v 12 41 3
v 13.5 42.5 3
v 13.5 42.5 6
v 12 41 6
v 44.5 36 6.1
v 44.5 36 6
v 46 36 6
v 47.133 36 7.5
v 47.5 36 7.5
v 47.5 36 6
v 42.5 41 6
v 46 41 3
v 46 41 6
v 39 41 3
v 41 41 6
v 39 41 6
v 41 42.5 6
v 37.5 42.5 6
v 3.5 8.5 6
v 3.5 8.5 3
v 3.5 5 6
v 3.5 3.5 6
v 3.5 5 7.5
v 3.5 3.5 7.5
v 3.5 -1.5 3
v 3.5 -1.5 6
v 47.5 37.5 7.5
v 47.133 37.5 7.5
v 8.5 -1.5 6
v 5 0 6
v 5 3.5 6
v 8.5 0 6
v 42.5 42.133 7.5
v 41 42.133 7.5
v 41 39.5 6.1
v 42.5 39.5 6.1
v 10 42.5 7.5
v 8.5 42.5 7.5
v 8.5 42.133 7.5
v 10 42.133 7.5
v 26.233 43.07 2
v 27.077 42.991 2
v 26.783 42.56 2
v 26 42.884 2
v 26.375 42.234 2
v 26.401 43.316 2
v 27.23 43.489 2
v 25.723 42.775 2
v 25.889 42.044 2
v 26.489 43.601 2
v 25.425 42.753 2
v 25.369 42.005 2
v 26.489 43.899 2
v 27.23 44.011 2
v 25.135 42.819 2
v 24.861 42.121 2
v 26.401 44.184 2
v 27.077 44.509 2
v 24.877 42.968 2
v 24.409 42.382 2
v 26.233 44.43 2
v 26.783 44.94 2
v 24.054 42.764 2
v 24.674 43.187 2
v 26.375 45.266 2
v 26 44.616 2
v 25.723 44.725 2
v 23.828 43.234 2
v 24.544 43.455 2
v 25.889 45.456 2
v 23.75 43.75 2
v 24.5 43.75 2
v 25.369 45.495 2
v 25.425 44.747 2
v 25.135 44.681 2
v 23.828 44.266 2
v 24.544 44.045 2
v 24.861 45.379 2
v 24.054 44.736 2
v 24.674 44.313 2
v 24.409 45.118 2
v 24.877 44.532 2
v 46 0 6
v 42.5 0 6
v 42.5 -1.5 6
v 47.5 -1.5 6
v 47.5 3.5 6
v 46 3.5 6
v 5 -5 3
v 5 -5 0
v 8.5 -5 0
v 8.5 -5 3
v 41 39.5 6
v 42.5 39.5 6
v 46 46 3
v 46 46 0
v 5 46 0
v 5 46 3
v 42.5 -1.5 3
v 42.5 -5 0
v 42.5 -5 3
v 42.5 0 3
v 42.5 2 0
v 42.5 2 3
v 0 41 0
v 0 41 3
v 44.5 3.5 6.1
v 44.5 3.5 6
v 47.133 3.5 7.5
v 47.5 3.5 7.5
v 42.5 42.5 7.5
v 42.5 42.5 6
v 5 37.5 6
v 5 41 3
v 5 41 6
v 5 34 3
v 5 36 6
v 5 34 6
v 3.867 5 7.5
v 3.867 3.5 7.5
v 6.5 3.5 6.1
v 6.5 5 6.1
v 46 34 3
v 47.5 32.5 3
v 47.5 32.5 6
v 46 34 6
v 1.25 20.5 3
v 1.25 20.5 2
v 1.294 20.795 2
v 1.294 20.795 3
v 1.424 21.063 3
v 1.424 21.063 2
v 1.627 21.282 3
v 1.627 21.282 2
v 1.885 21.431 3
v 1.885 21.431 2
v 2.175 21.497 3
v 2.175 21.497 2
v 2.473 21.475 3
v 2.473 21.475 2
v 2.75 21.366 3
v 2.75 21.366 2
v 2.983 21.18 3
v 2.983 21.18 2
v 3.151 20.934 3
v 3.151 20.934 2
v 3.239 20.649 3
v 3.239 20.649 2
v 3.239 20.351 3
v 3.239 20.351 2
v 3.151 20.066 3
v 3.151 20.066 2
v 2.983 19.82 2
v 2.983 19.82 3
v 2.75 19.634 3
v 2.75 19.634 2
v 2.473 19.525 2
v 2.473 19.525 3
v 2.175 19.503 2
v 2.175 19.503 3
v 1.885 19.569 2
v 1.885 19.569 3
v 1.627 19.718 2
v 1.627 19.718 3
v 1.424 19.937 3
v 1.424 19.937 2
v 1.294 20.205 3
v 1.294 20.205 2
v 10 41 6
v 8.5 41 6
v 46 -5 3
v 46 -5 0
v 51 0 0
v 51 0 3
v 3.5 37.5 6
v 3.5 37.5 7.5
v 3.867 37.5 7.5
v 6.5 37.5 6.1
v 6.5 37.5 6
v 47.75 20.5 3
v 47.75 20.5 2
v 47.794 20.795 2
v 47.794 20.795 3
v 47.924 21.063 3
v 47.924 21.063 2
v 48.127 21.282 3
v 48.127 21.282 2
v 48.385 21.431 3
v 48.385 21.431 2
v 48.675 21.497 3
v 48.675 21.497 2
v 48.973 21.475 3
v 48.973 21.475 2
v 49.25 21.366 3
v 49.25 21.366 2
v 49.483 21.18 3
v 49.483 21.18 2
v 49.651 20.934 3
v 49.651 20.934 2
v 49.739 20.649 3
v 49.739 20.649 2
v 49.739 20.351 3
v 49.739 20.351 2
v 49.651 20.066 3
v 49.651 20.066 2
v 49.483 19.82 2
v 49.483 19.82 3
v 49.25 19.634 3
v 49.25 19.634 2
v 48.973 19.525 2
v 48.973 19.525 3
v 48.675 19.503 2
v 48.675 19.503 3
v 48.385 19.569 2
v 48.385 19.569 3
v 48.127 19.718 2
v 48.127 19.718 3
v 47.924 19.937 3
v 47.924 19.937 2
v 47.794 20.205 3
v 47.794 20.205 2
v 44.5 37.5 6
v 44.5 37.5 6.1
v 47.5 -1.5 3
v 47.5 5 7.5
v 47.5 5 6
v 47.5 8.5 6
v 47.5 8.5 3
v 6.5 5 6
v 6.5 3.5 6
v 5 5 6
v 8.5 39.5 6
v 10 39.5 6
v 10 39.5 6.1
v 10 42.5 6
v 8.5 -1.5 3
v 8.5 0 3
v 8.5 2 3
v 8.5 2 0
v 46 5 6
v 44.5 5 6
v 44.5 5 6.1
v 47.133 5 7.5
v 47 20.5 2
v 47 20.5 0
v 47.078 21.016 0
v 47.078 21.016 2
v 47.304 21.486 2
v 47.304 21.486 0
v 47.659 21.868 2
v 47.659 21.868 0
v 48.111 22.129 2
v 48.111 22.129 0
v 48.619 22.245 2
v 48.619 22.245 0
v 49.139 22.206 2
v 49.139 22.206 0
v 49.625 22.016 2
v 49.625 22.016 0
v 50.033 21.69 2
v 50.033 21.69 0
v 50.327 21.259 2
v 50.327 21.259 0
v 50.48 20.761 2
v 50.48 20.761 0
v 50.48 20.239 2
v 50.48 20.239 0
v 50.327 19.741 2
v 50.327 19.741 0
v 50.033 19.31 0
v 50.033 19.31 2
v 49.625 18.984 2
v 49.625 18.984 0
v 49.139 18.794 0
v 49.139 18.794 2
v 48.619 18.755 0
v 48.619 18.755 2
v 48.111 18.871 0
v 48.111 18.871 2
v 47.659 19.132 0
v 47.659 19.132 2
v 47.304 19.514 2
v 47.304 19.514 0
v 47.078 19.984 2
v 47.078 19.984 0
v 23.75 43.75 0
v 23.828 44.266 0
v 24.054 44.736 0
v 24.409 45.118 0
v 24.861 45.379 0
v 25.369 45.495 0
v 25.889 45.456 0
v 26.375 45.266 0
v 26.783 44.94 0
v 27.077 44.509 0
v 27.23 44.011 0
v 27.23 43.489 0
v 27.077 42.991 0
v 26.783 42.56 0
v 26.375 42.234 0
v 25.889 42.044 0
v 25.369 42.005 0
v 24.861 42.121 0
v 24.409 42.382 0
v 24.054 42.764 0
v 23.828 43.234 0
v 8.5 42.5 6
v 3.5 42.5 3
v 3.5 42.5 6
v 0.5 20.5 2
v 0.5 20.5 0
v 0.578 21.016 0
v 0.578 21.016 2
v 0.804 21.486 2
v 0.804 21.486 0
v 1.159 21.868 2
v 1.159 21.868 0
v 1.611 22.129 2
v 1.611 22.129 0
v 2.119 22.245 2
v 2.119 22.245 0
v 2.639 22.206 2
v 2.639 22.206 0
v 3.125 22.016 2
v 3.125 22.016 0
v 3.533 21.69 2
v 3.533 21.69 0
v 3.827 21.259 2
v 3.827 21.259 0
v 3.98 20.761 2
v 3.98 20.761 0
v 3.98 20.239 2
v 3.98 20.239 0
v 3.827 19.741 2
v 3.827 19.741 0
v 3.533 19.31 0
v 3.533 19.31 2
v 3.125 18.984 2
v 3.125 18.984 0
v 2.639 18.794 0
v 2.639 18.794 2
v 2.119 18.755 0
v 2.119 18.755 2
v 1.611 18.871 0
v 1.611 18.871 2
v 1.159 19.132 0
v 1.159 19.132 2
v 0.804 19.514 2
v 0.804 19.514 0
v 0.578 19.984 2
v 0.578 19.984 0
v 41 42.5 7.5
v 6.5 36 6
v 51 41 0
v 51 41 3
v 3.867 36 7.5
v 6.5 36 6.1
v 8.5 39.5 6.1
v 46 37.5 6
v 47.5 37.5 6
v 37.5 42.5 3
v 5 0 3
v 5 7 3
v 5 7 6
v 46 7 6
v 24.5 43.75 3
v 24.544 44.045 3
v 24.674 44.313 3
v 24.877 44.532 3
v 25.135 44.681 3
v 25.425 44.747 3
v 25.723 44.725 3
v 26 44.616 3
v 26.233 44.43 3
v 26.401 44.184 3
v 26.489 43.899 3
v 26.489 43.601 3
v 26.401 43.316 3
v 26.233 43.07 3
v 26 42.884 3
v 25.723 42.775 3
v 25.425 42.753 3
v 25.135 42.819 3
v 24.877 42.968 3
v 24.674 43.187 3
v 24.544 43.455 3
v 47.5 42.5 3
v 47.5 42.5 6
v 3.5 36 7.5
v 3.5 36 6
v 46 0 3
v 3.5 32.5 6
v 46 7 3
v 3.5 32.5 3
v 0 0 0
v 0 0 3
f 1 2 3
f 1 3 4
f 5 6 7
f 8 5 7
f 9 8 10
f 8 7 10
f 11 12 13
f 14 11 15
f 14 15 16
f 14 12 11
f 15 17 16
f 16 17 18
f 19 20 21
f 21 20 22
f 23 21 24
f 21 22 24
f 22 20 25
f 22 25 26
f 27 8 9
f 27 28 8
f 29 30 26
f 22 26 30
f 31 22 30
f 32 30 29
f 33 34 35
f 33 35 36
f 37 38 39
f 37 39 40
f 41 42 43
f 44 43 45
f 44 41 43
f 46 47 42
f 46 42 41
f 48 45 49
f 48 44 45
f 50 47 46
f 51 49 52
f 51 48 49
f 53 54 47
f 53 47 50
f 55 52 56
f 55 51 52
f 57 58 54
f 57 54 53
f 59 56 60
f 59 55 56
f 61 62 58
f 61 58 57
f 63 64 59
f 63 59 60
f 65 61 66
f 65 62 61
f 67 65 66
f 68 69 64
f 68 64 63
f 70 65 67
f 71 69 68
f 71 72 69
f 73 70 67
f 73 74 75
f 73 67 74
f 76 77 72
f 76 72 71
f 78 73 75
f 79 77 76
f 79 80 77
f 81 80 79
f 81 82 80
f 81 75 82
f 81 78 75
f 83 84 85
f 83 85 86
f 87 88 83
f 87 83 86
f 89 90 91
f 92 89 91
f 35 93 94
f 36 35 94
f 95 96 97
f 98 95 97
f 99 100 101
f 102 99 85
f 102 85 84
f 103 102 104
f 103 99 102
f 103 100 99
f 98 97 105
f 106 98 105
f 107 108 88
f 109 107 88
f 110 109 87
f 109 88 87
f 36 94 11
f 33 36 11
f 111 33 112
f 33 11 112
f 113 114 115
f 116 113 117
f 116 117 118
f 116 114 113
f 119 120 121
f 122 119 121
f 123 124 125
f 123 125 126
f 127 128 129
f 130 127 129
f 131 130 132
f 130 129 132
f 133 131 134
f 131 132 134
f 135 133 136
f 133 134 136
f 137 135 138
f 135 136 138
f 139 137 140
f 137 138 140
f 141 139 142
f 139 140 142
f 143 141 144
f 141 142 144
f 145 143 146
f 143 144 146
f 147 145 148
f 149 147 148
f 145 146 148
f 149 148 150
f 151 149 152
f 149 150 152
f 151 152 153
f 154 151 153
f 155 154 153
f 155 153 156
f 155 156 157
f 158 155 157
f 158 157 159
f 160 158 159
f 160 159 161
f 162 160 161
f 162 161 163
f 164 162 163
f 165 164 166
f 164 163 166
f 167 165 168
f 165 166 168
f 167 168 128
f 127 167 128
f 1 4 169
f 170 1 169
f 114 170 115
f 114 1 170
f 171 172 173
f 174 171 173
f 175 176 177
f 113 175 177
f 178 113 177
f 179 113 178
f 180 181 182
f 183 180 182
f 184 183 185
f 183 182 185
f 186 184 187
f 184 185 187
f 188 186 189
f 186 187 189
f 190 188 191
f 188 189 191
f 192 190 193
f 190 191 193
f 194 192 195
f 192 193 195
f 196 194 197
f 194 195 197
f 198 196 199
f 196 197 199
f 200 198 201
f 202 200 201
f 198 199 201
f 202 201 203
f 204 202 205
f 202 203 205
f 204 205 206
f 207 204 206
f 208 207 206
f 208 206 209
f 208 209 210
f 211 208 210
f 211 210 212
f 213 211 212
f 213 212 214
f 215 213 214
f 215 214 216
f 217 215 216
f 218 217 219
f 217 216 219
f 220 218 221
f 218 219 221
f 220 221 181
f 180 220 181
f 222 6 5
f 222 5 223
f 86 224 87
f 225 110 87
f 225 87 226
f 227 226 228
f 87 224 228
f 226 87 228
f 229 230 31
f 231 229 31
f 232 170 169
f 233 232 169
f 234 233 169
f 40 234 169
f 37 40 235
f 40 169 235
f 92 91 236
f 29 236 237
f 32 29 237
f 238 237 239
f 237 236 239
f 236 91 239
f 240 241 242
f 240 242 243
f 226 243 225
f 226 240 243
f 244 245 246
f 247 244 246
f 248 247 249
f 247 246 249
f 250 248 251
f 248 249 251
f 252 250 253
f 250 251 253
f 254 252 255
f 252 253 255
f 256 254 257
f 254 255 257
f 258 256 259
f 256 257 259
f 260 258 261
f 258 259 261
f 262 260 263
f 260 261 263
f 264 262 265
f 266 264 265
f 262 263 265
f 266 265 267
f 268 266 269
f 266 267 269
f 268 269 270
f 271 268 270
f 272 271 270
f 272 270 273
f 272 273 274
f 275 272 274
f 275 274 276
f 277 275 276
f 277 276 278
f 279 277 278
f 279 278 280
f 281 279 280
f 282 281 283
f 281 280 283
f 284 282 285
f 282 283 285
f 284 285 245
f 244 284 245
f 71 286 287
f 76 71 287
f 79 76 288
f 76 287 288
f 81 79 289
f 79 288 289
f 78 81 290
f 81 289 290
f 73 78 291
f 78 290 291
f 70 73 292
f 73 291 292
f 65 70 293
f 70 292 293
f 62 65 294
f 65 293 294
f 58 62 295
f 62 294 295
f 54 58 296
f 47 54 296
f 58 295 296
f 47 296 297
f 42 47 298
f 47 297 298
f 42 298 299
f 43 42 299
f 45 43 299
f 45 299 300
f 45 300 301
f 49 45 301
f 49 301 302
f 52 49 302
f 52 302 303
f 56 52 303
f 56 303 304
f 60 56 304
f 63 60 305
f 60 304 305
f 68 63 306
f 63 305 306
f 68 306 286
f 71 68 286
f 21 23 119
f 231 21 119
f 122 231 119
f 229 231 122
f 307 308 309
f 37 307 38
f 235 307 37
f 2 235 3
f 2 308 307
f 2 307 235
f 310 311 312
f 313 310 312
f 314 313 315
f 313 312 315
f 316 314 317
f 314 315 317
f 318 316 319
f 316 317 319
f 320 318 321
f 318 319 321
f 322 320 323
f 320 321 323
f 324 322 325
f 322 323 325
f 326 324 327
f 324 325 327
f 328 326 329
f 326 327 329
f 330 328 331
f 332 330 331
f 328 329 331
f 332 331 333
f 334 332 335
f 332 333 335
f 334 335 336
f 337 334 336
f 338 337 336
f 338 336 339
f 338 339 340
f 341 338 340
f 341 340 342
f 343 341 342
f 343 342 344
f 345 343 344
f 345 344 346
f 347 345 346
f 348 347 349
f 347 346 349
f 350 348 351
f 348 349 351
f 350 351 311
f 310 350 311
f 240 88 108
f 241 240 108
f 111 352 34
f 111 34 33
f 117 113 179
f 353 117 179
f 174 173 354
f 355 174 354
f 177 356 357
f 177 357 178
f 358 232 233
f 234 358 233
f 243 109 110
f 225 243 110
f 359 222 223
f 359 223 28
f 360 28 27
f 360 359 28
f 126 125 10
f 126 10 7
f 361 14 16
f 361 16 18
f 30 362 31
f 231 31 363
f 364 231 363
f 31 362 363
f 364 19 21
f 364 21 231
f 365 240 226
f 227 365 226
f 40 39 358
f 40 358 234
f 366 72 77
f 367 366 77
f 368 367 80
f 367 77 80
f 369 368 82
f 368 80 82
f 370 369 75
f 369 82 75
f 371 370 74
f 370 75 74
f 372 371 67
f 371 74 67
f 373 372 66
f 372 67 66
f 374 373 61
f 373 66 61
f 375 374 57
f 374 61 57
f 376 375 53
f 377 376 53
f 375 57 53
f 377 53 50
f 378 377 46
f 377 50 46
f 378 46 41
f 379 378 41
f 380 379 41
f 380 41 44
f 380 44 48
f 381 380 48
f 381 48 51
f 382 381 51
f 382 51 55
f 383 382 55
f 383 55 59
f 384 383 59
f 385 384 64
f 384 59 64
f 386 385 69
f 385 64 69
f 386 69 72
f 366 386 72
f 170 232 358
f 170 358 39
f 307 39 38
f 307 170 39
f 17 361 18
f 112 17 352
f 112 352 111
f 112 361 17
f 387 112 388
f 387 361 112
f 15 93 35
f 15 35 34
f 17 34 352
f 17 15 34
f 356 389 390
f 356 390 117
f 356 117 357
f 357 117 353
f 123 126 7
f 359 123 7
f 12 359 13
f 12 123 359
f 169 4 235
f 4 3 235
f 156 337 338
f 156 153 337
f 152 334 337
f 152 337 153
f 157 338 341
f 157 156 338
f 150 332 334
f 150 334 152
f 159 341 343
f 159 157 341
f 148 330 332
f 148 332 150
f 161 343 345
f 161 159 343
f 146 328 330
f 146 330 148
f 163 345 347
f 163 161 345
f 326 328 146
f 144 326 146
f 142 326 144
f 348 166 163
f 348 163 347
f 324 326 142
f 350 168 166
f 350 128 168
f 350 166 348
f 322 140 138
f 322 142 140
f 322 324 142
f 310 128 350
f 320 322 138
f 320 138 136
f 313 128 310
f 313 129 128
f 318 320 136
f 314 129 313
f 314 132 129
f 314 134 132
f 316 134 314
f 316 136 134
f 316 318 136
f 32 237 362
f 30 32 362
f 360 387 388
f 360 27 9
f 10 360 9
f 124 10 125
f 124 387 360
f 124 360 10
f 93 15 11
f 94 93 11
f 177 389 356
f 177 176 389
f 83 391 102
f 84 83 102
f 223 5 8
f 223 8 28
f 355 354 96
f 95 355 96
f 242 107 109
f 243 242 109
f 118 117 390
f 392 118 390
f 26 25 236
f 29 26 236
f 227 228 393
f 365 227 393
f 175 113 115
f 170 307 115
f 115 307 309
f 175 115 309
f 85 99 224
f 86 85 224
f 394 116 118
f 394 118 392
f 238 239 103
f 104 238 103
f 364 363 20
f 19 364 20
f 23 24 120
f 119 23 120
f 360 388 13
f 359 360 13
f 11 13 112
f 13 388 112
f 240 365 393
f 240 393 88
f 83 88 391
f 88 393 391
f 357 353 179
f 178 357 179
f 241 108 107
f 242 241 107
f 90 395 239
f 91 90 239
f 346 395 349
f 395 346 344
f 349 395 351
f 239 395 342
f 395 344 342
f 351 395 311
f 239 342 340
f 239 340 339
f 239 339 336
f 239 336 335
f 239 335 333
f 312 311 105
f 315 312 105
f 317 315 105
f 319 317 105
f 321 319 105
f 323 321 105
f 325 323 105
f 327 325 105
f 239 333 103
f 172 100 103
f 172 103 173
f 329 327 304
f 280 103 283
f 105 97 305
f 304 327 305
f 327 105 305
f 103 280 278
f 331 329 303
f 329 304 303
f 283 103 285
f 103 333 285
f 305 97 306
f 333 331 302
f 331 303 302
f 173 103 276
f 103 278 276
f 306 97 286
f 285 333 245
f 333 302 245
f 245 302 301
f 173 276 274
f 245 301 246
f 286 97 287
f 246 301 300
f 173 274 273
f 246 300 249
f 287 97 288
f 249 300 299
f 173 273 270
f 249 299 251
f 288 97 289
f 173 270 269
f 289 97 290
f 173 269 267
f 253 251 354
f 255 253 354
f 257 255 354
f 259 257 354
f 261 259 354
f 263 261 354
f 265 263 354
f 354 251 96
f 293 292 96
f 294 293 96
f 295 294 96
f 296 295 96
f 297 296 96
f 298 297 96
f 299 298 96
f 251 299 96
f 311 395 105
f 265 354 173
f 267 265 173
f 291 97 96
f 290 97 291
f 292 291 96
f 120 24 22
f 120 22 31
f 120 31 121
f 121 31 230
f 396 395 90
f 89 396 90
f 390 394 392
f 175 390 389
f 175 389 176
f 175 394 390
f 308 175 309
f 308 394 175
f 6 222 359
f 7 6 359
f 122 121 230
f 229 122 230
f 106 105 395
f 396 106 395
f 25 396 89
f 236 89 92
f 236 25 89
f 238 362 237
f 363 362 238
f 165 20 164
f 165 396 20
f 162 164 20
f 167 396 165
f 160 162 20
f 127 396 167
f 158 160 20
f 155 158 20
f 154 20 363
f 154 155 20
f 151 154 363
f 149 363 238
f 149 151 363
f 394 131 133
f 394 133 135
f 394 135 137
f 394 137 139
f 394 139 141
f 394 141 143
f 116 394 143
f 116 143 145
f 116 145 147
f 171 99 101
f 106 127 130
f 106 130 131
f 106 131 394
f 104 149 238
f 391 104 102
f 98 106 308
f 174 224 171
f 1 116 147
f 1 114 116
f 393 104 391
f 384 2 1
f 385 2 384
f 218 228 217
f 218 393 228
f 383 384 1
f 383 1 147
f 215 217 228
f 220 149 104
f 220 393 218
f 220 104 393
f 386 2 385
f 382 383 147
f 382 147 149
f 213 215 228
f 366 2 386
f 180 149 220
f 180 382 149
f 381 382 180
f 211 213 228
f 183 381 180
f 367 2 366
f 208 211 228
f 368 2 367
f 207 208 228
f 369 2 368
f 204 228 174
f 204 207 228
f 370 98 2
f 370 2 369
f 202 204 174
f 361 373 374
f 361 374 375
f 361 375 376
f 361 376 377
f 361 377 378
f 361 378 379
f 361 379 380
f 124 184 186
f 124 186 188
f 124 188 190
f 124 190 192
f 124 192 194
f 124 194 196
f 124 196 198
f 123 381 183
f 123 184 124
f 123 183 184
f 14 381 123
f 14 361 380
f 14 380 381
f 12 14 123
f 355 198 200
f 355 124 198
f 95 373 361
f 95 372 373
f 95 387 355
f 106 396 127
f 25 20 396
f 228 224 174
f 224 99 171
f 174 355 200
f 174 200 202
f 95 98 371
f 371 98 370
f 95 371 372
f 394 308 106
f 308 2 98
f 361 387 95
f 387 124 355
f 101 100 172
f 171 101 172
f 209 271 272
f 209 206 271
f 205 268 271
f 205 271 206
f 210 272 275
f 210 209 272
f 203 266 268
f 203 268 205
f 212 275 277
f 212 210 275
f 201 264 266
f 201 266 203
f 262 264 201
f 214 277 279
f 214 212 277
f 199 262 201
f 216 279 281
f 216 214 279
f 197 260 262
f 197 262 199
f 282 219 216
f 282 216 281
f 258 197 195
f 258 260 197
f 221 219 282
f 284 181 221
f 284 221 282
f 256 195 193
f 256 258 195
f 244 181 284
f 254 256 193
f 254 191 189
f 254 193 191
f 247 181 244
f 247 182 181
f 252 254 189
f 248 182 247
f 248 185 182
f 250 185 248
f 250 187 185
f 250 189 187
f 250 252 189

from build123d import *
from OCP.BRepFilletAPI import BRepFilletAPI_MakeChamfer

# Parameters (mm, degrees)
BOSS_EXTRU_1_DEPTH           = 3
BOSS_EXTRU_2_DEPTH           = 3
ENL_V_MAT_EXTRU_1_DEPTH      = 69.745908969
ENL_V_MAT_EXTRU_1_DEPTH_BACK = 69.745908969
ESQUISSE3_W                  = 34
ESQUISSE3_H                  = 7
ESQUISSE4_R                  = 1.75
ENL_V_MAT_EXTRU_2_DEPTH      = 2
ESQUISSE5_R                  = 1
ENL_V_MAT_EXTRU_3_DEPTH      = 1
ESQUISSE6_W                  = 1.5
ESQUISSE6_H                  = 3
ESQUISSE6_W_2                = 3
ESQUISSE6_H_2                = 1.5
BOSS_EXTRU_3_DEPTH           = 1.5
CHANFREIN1_SIZE              = 1.4
CHANFREIN1_SIZE2             = 2.633017051
SYM_TRIE1_START              = 3.5
SYM_TRIE1_DEPTH              = 1.5


# Read off the part's stored shape, not the designer's step: Symétrie1
with BuildPart() as part:
    # Esquisse1 → Boss.-Extru.1 (new body)
    with BuildSketch(Plane.XY):
        Polygon((0, 0), (5, -5), (46, -5), (51, 0), (51, 41), (46, 46), (5, 46), (0, 41), align=None)
    extrude(amount=BOSS_EXTRU_1_DEPTH)

    # Esquisse2 → Boss.-Extru.2 (add)
    with BuildSketch(Plane.XY.offset(3)):
        Polygon((5, 41), (5, 34), (3.5, 32.5), (3.5, 42.5), (13.5, 42.5), (12, 41), align=None)
        Polygon((3.5, -1.5), (13.5, -1.5), (12, 0), (5, 0), (5, 7), (3.5, 8.5), align=None)
        Polygon((47.5, 42.5), (47.5, 32.5), (46, 34), (46, 41), (39, 41), (37.5, 42.5), align=None)
        Polygon((46, 7), (46, 0), (39, 0), (37.5, -1.5), (47.5, -1.5), (47.5, 8.5), align=None)
    extrude(amount=BOSS_EXTRU_2_DEPTH)

    # Esquisse3 → Enlèv. mat.-Extru.1 (cut, two sides: drawn at the far end of the back side and taken through both)
    with BuildSketch(Plane.XY.offset(3).offset(-ENL_V_MAT_EXTRU_1_DEPTH_BACK)):
        with Locations((25.5, -1.5)):
            Rectangle(ESQUISSE3_W, ESQUISSE3_H)
    extrude(amount=ENL_V_MAT_EXTRU_1_DEPTH + ENL_V_MAT_EXTRU_1_DEPTH_BACK, mode=Mode.SUBTRACT)

    # Esquisse4 → Enlèv. mat.-Extru.2 (cut)
    with BuildSketch(Plane(origin=(0, 0, 0), x_dir=(-1, 0, 0), z_dir=(0, 0, -1))):
        with Locations((-25.5, 43.75)):
            Circle(ESQUISSE4_R)
        with Locations((-48.75, 20.5)):
            Circle(ESQUISSE4_R)
        with Locations((-2.25, 20.5)):
            Circle(ESQUISSE4_R)
    extrude(amount=-ENL_V_MAT_EXTRU_2_DEPTH, mode=Mode.SUBTRACT)

    # Esquisse5 → Enlèv. mat.-Extru.3 (cut)
    with BuildSketch(Plane(origin=(0, 0, 2), x_dir=(-1, 0, 0), z_dir=(0, 0, -1))):
        with Locations((-25.5, 43.75)):
            Circle(ESQUISSE5_R)
        with Locations((-2.25, 20.5)):
            Circle(ESQUISSE5_R)
        with Locations((-48.75, 20.5)):
            Circle(ESQUISSE5_R)
    extrude(amount=-ENL_V_MAT_EXTRU_3_DEPTH, mode=Mode.SUBTRACT)

    # Esquisse6 → Boss.-Extru.3 (add)
    with BuildSketch(Plane.XY.offset(6)):
        with Locations((9.25, 41)):
            Rectangle(ESQUISSE6_W, ESQUISSE6_H)
        with Locations((41.75, 41)):
            Rectangle(ESQUISSE6_W, ESQUISSE6_H)
        with Locations((5, 36.75)):
            Rectangle(ESQUISSE6_W_2, ESQUISSE6_H_2)
        with Locations((46, 36.75)):
            Rectangle(ESQUISSE6_W_2, ESQUISSE6_H_2)
    extrude(amount=BOSS_EXTRU_3_DEPTH)

    # Chanfrein1: one chamfer whose edges measure the first distance from different faces: ONE call of the kernel's chamfer builder (chamfer() names one face for all edges)
    chanfrein1_edges_1 = [part.edges().sort_by_distance(p)[0] for p in [
        (9.25, 39.5, 7.5),
    ]]
    chanfrein1_side_1 = [part.faces().sort_by_distance(p)[0] for p in [
        (9.25, 39.5, 6.75),
    ]]
    chanfrein1_edges_2 = [part.edges().sort_by_distance(p)[0] for p in [
        (41.75, 39.5, 7.5),
    ]]
    chanfrein1_side_2 = [part.faces().sort_by_distance(p)[0] for p in [
        (41.75, 39.5, 6.75),
    ]]
    chanfrein1_edges_3 = [part.edges().sort_by_distance(p)[0] for p in [
        (6.5, 36.75, 7.5),
    ]]
    chanfrein1_side_3 = [part.faces().sort_by_distance(p)[0] for p in [
        (6.5, 36.75, 6.75),
    ]]
    chanfrein1_edges_4 = [part.edges().sort_by_distance(p)[0] for p in [
        (44.5, 36.75, 7.5),
    ]]
    chanfrein1_side_4 = [part.faces().sort_by_distance(p)[0] for p in [
        (44.5, 36.75, 6.75),
    ]]
    chanfrein1 = BRepFilletAPI_MakeChamfer(part.part.solid().wrapped)
    for e in chanfrein1_edges_1:
        chanfrein1.Add(CHANFREIN1_SIZE, CHANFREIN1_SIZE2, e.wrapped, chanfrein1_side_1[0].wrapped)  # the first distance lies on this face
    for e in chanfrein1_edges_2:
        chanfrein1.Add(CHANFREIN1_SIZE, CHANFREIN1_SIZE2, e.wrapped, chanfrein1_side_2[0].wrapped)  # the first distance lies on this face
    for e in chanfrein1_edges_3:
        chanfrein1.Add(CHANFREIN1_SIZE, CHANFREIN1_SIZE2, e.wrapped, chanfrein1_side_3[0].wrapped)  # the first distance lies on this face
    for e in chanfrein1_edges_4:
        chanfrein1.Add(CHANFREIN1_SIZE, CHANFREIN1_SIZE2, e.wrapped, chanfrein1_side_4[0].wrapped)  # the first distance lies on this face
    add(Compound.cast(chanfrein1.Shape()), mode=Mode.REPLACE)

    # Symétrie1 outline → Symétrie1 (add)
    with BuildSketch(Plane(origin=(0, 0, 0), x_dir=(1, 0, 0), z_dir=(0, 1, 0)).offset(SYM_TRIE1_START)):
        Polygon((3.5, -6), (3.5, -7.5), (3.866982949, -7.5), (6.5, -6.1), (6.5, -6), align=None)
        Polygon((47.5, -6), (44.5, -6), (44.5, -6.1), (47.133017051, -7.5), (47.5, -7.5), align=None)
    extrude(amount=SYM_TRIE1_DEPTH)


solid = part.part
